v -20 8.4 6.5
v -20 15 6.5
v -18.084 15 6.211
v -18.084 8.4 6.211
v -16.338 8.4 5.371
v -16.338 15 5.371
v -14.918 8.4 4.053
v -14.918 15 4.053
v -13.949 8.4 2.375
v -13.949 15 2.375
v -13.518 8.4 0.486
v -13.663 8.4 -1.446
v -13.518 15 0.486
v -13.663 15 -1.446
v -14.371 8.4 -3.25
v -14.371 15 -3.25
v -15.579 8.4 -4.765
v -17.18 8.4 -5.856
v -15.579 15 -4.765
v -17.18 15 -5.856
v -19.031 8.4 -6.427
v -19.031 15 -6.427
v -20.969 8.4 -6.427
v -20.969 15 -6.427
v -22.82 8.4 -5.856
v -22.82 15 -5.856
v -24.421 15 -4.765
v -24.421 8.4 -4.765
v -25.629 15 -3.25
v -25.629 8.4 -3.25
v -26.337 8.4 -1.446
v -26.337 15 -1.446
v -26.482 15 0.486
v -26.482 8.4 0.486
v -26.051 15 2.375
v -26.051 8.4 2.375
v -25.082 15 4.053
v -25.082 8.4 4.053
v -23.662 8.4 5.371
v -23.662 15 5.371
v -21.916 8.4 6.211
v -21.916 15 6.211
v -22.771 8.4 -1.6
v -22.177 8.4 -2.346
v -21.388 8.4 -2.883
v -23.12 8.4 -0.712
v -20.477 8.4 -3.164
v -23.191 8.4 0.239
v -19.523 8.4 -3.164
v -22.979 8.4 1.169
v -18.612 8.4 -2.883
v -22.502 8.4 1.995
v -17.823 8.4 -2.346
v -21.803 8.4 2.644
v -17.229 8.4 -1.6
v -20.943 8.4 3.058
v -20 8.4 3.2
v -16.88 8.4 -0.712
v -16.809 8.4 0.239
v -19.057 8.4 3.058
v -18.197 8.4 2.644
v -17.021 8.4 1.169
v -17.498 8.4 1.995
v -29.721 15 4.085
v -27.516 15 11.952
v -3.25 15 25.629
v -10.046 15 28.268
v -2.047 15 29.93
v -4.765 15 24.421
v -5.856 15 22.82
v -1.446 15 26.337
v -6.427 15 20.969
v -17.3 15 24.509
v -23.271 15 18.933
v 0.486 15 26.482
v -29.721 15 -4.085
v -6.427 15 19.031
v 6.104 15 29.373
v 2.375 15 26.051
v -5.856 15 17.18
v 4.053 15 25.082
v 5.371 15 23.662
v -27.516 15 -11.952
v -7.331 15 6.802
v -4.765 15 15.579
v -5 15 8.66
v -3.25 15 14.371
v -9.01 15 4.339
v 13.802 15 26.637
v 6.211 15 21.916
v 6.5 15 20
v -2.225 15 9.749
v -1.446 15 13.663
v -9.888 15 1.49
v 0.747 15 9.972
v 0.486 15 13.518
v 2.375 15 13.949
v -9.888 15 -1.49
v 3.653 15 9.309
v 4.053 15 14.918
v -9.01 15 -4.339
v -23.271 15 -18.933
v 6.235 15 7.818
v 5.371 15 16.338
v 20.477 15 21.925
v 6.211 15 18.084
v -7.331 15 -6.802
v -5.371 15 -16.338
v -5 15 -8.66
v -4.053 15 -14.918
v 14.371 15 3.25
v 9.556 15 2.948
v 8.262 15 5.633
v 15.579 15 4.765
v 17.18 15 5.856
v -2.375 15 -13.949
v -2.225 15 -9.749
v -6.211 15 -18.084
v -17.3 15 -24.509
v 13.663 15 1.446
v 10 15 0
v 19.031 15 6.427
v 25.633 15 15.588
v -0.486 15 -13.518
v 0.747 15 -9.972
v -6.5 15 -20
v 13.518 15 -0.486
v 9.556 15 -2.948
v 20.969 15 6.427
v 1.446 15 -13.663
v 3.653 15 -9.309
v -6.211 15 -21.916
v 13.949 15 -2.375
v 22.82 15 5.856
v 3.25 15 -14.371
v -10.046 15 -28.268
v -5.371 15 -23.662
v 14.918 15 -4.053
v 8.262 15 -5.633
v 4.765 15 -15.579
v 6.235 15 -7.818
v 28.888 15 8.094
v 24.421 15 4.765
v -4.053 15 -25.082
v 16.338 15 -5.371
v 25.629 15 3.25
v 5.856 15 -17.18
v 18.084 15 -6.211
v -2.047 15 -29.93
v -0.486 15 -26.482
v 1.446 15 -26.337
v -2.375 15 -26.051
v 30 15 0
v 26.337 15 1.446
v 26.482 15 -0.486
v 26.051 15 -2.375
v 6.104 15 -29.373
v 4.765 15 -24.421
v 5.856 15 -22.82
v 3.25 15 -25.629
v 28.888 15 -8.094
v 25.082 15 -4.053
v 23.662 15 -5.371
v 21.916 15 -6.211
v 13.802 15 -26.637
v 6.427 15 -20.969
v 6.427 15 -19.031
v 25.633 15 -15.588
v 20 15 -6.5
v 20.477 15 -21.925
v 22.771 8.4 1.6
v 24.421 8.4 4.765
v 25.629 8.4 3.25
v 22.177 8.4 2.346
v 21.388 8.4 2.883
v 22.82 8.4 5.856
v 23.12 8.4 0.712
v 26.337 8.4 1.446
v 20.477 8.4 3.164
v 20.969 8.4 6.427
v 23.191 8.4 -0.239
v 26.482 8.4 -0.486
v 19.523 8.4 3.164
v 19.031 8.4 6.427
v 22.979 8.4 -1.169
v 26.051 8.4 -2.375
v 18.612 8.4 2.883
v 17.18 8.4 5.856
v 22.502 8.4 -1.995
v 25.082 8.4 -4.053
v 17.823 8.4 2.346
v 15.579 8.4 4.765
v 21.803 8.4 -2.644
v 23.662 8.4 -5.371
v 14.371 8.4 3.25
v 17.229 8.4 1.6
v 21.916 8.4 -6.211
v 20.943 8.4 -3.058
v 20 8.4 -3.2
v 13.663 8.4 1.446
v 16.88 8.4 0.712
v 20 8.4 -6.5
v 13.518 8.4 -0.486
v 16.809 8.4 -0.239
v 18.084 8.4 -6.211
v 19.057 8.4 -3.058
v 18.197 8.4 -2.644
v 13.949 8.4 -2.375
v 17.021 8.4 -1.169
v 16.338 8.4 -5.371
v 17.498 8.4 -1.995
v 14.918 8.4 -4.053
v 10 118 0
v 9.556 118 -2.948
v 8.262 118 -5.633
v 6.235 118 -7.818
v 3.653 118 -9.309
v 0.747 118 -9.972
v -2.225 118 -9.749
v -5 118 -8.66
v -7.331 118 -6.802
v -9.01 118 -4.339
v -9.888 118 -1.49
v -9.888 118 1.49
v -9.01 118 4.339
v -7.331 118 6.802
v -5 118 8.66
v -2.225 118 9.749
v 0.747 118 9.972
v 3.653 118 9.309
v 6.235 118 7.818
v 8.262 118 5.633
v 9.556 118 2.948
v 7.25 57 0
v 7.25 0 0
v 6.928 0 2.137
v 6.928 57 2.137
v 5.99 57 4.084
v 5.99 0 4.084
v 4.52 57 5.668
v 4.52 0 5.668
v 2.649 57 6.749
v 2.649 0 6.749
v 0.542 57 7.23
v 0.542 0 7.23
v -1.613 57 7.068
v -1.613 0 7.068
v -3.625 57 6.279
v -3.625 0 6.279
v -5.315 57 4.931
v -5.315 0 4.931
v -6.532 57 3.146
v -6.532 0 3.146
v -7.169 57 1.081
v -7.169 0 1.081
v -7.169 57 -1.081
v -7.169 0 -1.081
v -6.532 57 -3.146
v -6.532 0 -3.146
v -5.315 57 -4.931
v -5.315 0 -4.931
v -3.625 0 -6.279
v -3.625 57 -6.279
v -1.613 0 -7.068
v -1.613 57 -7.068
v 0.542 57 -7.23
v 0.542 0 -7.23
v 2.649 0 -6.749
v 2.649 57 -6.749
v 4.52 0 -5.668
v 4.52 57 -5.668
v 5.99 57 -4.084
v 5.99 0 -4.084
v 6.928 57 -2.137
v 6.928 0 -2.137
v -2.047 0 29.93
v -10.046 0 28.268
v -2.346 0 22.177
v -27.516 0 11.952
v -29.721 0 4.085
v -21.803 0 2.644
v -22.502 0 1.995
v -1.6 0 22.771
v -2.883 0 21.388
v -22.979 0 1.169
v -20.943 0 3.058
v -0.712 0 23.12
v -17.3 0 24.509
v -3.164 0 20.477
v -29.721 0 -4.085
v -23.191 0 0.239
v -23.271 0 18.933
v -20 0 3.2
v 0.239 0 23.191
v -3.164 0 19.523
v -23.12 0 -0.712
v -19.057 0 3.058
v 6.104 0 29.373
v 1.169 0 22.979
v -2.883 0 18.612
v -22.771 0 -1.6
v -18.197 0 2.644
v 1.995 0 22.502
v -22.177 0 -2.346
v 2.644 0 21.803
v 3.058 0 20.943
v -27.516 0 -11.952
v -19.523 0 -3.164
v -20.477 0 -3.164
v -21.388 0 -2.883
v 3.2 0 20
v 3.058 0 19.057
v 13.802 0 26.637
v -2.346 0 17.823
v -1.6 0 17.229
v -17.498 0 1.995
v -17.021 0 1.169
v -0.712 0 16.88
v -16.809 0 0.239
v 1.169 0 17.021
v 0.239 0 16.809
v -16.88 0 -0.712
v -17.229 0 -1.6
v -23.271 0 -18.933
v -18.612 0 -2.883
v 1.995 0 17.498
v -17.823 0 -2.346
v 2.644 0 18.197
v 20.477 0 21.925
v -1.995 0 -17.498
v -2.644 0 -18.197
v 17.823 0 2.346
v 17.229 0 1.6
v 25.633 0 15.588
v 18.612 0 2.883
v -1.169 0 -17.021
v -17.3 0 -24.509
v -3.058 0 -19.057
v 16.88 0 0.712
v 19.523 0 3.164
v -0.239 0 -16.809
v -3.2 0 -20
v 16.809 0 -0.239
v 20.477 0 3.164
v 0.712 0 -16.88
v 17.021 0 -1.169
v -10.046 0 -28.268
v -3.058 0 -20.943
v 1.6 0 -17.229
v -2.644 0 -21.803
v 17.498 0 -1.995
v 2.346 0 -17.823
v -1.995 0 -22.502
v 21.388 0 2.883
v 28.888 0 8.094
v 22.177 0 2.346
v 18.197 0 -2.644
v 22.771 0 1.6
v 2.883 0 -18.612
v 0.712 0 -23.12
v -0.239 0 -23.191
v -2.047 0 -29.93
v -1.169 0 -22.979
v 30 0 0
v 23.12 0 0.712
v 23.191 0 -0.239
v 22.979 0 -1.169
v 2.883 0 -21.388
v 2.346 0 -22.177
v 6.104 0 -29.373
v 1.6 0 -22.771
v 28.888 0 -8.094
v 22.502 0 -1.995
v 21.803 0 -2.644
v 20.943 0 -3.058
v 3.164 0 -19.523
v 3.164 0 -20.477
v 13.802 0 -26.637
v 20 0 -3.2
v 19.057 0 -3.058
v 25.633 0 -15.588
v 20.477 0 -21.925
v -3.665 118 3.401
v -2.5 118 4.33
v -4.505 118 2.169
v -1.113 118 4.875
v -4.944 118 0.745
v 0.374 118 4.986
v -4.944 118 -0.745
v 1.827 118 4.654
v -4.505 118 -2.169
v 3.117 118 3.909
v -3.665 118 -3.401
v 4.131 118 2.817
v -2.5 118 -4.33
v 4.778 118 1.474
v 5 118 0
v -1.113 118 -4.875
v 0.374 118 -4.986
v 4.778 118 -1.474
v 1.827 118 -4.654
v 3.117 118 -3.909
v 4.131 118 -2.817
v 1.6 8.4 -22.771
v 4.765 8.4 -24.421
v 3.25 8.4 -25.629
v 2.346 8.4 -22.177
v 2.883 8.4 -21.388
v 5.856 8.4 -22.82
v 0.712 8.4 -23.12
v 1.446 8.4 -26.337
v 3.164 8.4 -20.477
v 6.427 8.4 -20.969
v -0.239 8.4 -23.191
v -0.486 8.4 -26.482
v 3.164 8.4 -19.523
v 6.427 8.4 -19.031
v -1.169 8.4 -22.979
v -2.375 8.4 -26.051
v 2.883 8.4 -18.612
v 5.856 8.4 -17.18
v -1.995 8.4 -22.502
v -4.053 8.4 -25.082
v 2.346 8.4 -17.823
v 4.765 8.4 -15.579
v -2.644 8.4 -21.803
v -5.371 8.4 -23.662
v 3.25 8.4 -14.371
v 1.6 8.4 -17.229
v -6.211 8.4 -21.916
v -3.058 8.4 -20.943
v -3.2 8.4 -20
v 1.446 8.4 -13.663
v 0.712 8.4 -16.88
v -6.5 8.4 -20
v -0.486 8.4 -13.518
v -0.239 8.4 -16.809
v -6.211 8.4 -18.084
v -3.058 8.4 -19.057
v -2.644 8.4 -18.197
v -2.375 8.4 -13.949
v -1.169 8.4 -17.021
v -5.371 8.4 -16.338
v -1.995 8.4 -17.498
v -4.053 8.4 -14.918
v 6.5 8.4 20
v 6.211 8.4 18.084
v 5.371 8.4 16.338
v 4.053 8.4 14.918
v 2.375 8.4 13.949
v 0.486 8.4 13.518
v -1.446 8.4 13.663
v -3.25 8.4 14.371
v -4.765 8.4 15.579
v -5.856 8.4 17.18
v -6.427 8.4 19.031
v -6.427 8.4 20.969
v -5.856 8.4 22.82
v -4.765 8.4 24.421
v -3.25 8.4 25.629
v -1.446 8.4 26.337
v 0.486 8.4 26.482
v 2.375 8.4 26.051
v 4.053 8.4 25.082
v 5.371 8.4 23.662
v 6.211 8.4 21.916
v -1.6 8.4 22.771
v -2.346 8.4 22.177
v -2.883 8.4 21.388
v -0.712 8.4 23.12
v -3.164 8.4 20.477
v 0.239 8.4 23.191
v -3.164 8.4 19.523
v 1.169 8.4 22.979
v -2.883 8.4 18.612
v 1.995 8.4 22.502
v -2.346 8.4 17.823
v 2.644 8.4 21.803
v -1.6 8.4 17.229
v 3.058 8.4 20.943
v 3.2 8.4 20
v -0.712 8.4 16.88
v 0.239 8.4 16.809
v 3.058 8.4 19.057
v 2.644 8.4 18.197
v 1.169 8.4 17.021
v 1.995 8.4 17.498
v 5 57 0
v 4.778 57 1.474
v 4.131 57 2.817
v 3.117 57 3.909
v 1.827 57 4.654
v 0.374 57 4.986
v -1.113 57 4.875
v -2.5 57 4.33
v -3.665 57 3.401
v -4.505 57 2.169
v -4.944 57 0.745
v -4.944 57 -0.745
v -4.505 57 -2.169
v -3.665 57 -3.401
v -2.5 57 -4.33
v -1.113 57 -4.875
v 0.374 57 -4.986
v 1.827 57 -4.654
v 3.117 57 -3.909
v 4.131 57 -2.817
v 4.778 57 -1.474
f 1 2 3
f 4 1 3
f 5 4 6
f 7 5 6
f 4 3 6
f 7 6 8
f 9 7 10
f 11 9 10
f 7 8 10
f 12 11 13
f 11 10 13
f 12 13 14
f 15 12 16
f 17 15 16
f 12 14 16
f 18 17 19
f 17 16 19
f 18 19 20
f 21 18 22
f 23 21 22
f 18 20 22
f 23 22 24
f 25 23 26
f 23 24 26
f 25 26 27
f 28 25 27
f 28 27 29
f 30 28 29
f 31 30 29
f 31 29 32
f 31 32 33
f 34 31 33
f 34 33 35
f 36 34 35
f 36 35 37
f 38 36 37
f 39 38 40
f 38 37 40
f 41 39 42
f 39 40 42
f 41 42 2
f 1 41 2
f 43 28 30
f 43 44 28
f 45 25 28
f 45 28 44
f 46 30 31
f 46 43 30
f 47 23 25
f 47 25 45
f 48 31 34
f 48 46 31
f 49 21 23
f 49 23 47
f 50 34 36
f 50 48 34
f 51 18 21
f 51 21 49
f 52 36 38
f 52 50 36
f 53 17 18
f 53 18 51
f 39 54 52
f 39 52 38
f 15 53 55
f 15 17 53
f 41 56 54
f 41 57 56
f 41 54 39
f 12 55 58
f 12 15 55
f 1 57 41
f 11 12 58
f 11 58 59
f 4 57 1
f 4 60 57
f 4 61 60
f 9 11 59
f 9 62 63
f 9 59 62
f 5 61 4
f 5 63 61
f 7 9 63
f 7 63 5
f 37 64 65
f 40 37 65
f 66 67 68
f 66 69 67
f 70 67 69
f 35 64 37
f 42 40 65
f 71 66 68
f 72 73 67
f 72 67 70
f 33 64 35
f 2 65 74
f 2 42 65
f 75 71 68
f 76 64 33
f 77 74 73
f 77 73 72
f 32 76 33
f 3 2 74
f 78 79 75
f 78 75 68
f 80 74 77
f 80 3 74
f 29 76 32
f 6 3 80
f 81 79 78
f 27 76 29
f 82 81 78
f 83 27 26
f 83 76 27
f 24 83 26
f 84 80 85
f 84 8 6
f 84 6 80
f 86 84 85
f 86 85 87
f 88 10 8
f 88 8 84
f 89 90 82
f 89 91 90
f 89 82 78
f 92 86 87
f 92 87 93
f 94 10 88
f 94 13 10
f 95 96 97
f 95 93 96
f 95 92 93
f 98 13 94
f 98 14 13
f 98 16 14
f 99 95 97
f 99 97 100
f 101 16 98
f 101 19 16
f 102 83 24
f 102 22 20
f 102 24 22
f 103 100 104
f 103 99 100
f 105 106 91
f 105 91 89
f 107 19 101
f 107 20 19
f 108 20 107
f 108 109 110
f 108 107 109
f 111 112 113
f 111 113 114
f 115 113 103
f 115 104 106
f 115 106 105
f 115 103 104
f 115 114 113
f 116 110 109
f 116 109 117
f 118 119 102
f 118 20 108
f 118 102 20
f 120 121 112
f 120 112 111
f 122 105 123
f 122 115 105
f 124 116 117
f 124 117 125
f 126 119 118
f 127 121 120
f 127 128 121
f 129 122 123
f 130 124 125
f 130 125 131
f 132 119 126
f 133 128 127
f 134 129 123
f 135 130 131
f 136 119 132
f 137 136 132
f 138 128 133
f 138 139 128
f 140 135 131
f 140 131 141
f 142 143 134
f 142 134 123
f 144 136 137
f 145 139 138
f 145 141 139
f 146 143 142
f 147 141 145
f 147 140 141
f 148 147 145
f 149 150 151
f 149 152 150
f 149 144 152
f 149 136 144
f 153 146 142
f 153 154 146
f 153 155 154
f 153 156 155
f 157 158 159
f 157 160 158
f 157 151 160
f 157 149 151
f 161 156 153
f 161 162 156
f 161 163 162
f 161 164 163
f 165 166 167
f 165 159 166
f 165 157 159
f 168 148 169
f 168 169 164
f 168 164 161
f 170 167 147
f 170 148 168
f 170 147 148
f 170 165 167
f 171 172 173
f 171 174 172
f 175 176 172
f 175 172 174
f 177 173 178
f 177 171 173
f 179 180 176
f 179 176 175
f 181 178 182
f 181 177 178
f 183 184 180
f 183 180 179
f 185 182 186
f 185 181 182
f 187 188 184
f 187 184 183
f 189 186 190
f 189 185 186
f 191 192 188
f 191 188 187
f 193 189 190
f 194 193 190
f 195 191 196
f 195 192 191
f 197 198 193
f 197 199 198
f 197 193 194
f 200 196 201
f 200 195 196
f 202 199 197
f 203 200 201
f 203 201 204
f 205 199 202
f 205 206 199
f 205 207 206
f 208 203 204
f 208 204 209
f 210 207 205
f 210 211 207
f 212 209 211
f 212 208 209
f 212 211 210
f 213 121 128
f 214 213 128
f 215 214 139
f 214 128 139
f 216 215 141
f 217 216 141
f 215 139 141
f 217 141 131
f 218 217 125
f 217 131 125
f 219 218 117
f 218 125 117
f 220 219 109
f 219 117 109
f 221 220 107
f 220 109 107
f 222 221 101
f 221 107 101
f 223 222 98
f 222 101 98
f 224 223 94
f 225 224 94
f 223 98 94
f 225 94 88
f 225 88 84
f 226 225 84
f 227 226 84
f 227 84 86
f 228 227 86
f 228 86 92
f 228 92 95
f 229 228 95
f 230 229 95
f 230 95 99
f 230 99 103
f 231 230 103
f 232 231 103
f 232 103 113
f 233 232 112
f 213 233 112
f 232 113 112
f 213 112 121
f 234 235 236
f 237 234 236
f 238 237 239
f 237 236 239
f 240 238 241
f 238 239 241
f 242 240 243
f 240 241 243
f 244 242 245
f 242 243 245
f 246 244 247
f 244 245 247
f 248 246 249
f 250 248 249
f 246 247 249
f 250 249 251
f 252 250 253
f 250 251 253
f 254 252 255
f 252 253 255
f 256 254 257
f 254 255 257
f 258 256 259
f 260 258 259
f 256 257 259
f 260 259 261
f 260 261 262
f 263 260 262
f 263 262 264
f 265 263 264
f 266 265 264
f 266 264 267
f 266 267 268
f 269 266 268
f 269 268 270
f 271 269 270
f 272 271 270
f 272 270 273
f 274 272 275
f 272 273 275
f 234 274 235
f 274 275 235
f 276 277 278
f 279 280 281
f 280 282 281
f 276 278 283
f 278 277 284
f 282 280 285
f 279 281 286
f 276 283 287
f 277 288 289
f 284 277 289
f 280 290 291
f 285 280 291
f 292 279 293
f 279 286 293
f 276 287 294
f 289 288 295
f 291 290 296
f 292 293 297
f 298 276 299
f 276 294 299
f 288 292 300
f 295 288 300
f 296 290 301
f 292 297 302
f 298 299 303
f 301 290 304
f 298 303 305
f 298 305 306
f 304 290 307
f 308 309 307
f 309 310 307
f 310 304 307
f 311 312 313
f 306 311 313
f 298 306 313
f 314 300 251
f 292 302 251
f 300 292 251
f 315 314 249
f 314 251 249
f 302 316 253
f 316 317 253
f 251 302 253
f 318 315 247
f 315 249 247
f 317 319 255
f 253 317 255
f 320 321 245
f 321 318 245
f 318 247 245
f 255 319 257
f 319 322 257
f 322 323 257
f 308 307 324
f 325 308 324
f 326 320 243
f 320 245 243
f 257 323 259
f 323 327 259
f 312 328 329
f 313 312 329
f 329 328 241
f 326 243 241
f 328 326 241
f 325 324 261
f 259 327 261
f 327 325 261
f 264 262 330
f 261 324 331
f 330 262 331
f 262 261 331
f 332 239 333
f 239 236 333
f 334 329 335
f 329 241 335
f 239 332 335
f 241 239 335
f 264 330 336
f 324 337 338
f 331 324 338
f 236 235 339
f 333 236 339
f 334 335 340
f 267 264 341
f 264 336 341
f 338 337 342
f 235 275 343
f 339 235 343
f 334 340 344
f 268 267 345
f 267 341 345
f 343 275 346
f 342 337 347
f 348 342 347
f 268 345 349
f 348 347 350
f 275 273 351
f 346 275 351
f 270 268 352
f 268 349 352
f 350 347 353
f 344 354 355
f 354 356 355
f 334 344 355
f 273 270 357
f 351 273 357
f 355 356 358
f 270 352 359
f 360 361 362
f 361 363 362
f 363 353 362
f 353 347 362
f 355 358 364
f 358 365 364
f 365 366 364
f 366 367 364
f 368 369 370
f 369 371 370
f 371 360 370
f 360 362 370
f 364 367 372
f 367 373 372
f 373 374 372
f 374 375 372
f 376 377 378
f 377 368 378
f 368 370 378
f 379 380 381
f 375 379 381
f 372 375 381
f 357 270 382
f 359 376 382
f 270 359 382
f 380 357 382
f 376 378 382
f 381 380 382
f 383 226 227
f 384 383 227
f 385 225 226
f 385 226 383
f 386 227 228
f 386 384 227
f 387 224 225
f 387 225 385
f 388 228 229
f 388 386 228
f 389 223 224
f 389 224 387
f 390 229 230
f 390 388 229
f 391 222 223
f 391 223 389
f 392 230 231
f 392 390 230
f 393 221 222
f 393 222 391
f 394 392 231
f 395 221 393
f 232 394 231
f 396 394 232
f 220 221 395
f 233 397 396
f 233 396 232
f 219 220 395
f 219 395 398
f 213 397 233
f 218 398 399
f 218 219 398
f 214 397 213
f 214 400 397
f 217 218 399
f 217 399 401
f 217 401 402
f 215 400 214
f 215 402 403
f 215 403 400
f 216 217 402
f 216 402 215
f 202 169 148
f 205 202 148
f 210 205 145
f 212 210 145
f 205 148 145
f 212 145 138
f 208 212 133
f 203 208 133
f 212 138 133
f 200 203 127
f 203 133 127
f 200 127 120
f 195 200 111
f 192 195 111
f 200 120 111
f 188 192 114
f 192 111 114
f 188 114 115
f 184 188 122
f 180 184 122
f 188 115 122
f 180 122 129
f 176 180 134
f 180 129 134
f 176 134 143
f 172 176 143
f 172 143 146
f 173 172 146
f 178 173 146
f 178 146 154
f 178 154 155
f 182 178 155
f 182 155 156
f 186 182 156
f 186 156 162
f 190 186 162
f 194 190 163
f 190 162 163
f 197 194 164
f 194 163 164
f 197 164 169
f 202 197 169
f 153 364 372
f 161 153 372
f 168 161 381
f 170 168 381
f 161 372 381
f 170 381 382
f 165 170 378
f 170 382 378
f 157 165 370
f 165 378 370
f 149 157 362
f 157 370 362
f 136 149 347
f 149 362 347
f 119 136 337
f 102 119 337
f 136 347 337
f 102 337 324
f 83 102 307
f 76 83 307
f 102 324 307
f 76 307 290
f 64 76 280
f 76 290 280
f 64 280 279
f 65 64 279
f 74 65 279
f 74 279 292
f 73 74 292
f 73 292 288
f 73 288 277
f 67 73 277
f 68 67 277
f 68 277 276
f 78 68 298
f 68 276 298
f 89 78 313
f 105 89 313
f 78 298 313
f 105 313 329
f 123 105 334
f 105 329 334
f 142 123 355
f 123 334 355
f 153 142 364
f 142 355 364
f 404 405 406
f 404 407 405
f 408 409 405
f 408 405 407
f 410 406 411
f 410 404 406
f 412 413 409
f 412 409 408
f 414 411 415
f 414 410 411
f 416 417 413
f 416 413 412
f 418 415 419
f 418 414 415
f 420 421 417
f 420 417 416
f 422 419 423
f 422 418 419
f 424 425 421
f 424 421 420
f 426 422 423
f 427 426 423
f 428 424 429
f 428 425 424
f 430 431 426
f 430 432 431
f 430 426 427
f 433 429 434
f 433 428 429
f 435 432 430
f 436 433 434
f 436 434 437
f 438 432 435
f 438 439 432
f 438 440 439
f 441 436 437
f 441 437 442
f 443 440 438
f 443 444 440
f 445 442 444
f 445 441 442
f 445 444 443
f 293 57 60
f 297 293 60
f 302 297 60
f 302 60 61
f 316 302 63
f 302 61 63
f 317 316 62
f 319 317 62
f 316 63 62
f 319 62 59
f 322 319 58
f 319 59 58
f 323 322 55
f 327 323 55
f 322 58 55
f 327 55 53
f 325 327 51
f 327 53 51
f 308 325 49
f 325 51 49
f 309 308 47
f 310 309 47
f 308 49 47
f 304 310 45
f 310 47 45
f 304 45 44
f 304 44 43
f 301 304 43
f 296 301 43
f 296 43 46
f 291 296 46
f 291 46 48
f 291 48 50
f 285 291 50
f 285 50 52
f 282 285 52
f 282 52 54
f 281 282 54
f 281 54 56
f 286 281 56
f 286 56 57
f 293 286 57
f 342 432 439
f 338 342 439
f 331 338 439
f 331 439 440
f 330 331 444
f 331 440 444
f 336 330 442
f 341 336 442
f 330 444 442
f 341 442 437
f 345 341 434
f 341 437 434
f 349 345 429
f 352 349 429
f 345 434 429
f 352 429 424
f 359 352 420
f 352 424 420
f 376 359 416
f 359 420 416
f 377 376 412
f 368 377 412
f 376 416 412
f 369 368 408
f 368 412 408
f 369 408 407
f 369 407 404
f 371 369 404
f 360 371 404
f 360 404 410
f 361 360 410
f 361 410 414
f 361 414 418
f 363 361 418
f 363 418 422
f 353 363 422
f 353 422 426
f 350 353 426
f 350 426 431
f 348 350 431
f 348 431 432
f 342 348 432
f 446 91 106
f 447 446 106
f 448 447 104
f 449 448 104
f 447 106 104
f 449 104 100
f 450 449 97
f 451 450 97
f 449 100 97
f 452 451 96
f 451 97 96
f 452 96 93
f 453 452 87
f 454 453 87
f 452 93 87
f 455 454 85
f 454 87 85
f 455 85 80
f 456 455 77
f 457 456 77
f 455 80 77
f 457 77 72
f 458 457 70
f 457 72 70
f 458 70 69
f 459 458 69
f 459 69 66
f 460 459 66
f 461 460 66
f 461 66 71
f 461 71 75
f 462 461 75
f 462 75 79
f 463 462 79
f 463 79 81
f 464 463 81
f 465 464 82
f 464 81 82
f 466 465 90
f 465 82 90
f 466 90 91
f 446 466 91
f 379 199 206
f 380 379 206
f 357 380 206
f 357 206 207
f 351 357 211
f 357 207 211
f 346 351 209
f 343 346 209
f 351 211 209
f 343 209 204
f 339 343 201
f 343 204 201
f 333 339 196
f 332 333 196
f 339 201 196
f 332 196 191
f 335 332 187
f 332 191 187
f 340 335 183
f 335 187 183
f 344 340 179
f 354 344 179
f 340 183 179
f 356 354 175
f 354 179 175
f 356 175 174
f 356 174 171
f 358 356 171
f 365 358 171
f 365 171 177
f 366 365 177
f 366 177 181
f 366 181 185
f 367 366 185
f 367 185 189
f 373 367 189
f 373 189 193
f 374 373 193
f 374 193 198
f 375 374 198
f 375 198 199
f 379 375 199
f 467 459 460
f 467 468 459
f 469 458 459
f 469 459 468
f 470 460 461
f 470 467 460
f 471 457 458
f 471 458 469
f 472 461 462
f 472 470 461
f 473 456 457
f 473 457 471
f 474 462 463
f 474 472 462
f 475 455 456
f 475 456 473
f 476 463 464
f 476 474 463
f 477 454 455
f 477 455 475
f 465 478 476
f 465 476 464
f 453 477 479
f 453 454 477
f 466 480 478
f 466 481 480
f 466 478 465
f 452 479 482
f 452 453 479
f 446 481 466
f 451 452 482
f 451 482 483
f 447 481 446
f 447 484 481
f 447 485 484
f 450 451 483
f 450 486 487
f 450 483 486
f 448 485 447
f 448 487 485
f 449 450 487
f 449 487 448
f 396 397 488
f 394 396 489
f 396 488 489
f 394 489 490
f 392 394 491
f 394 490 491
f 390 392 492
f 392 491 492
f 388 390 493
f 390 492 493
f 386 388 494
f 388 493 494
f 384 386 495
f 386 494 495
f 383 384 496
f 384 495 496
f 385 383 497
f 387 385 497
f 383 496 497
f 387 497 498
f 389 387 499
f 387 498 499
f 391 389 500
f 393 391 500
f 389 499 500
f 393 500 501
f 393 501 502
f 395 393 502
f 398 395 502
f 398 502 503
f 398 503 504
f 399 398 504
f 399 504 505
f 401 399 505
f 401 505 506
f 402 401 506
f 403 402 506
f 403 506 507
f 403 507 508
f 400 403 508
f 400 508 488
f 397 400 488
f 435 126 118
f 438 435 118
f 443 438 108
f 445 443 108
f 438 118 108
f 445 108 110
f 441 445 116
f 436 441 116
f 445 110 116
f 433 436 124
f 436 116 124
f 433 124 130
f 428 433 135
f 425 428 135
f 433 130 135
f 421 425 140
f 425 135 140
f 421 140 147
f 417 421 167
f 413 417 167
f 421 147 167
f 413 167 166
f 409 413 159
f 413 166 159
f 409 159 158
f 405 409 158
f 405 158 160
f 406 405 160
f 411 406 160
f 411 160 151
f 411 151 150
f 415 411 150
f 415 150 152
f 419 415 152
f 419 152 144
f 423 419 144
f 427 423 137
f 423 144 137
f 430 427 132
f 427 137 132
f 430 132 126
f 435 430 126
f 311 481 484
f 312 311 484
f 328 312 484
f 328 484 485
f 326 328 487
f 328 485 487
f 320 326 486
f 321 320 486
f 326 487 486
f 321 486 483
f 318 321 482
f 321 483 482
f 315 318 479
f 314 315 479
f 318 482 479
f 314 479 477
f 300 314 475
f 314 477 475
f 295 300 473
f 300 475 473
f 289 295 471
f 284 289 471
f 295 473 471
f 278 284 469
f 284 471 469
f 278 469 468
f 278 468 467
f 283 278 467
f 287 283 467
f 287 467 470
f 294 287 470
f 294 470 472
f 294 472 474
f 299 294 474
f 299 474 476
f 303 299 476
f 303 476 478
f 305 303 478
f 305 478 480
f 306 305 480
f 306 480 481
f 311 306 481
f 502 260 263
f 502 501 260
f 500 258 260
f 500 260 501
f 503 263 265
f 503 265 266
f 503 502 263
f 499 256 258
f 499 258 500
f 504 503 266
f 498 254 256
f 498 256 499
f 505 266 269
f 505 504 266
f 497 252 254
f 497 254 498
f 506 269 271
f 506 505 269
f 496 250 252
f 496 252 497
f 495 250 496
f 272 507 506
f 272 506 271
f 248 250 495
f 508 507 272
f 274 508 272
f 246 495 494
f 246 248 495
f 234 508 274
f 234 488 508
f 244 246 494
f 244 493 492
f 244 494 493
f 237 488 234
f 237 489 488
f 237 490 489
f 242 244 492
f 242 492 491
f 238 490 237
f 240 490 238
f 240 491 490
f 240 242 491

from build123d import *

# Parameters (mm, degrees)
SKETCH1_R           = 30
BOSS_EXTRUDE1_DEPTH = 15
SKETCH2_R           = 10
BOSS_EXTRUDE2_DEPTH = 103
SKETCH4_R           = 7.25
CUT_EXTRUDE1_DEPTH  = 57
SKETCH5_R           = 5
CUT_EXTRUDE2_DEPTH  = 62
SKETCH7_R           = 6.5
CUT_EXTRUDE3_DEPTH  = 6.6
SKETCH8_R           = 3.2
CUT_EXTRUDE4_DEPTH  = 9.4
CIRPATTERN1_COUNT   = 4


with BuildPart() as part:
    # Sketch1 → Boss-Extrude1 (new body)
    with BuildSketch(Plane(origin=(0, 0, 0), x_dir=(1, 0, 0), z_dir=(0, 1, 0))):
        Circle(SKETCH1_R)
    extrude(amount=BOSS_EXTRUDE1_DEPTH)

    # Sketch2 → Boss-Extrude2 (add)
    with BuildSketch(Plane(origin=(0, 15, 0), x_dir=(1, 0, 0), z_dir=(0, 1, 0))):
        Circle(SKETCH2_R)
    extrude(amount=BOSS_EXTRUDE2_DEPTH)

    # Sketch4 → Cut-Extrude1 (cut)
    with BuildSketch(Plane.XZ):
        Circle(SKETCH4_R)
    extrude(amount=-CUT_EXTRUDE1_DEPTH, mode=Mode.SUBTRACT)

    # Sketch5 → Cut-Extrude2 (cut, through all)
    with BuildSketch(Plane.XZ.offset(-57)):
        Circle(SKETCH5_R)
    extrude(amount=-CUT_EXTRUDE2_DEPTH, mode=Mode.SUBTRACT)

    # Sketch7 → Cut-Extrude3 (cut)
    with BuildSketch(Plane(origin=(0, 15, 0), x_dir=(1, 0, 0), z_dir=(0, 1, 0))):
        with Locations((0, -20)):
            Circle(SKETCH7_R)
    cut_extrude3 = extrude(amount=-CUT_EXTRUDE3_DEPTH, mode=Mode.SUBTRACT)

    # Sketch8 → Cut-Extrude4 (cut, through all)
    with BuildSketch(Plane(origin=(0, 8.4, 0), x_dir=(1, 0, 0), z_dir=(0, 1, 0))):
        with Locations((0, -20)):
            Circle(SKETCH8_R)
    cut_extrude4 = extrude(amount=-CUT_EXTRUDE4_DEPTH, mode=Mode.SUBTRACT)

    # CirPattern1: Cut-Extrude3, Cut-Extrude4 ×4 about axis
    cirpattern1_axis = Axis((0, 0, 0), (0, 1, 0))
    for i in range(1, CIRPATTERN1_COUNT):
        add(cut_extrude3.rotate(cirpattern1_axis, i * 360 / CIRPATTERN1_COUNT), mode=Mode.SUBTRACT)
        add(cut_extrude4.rotate(cirpattern1_axis, i * 360 / CIRPATTERN1_COUNT), mode=Mode.SUBTRACT)


solid = part.part
